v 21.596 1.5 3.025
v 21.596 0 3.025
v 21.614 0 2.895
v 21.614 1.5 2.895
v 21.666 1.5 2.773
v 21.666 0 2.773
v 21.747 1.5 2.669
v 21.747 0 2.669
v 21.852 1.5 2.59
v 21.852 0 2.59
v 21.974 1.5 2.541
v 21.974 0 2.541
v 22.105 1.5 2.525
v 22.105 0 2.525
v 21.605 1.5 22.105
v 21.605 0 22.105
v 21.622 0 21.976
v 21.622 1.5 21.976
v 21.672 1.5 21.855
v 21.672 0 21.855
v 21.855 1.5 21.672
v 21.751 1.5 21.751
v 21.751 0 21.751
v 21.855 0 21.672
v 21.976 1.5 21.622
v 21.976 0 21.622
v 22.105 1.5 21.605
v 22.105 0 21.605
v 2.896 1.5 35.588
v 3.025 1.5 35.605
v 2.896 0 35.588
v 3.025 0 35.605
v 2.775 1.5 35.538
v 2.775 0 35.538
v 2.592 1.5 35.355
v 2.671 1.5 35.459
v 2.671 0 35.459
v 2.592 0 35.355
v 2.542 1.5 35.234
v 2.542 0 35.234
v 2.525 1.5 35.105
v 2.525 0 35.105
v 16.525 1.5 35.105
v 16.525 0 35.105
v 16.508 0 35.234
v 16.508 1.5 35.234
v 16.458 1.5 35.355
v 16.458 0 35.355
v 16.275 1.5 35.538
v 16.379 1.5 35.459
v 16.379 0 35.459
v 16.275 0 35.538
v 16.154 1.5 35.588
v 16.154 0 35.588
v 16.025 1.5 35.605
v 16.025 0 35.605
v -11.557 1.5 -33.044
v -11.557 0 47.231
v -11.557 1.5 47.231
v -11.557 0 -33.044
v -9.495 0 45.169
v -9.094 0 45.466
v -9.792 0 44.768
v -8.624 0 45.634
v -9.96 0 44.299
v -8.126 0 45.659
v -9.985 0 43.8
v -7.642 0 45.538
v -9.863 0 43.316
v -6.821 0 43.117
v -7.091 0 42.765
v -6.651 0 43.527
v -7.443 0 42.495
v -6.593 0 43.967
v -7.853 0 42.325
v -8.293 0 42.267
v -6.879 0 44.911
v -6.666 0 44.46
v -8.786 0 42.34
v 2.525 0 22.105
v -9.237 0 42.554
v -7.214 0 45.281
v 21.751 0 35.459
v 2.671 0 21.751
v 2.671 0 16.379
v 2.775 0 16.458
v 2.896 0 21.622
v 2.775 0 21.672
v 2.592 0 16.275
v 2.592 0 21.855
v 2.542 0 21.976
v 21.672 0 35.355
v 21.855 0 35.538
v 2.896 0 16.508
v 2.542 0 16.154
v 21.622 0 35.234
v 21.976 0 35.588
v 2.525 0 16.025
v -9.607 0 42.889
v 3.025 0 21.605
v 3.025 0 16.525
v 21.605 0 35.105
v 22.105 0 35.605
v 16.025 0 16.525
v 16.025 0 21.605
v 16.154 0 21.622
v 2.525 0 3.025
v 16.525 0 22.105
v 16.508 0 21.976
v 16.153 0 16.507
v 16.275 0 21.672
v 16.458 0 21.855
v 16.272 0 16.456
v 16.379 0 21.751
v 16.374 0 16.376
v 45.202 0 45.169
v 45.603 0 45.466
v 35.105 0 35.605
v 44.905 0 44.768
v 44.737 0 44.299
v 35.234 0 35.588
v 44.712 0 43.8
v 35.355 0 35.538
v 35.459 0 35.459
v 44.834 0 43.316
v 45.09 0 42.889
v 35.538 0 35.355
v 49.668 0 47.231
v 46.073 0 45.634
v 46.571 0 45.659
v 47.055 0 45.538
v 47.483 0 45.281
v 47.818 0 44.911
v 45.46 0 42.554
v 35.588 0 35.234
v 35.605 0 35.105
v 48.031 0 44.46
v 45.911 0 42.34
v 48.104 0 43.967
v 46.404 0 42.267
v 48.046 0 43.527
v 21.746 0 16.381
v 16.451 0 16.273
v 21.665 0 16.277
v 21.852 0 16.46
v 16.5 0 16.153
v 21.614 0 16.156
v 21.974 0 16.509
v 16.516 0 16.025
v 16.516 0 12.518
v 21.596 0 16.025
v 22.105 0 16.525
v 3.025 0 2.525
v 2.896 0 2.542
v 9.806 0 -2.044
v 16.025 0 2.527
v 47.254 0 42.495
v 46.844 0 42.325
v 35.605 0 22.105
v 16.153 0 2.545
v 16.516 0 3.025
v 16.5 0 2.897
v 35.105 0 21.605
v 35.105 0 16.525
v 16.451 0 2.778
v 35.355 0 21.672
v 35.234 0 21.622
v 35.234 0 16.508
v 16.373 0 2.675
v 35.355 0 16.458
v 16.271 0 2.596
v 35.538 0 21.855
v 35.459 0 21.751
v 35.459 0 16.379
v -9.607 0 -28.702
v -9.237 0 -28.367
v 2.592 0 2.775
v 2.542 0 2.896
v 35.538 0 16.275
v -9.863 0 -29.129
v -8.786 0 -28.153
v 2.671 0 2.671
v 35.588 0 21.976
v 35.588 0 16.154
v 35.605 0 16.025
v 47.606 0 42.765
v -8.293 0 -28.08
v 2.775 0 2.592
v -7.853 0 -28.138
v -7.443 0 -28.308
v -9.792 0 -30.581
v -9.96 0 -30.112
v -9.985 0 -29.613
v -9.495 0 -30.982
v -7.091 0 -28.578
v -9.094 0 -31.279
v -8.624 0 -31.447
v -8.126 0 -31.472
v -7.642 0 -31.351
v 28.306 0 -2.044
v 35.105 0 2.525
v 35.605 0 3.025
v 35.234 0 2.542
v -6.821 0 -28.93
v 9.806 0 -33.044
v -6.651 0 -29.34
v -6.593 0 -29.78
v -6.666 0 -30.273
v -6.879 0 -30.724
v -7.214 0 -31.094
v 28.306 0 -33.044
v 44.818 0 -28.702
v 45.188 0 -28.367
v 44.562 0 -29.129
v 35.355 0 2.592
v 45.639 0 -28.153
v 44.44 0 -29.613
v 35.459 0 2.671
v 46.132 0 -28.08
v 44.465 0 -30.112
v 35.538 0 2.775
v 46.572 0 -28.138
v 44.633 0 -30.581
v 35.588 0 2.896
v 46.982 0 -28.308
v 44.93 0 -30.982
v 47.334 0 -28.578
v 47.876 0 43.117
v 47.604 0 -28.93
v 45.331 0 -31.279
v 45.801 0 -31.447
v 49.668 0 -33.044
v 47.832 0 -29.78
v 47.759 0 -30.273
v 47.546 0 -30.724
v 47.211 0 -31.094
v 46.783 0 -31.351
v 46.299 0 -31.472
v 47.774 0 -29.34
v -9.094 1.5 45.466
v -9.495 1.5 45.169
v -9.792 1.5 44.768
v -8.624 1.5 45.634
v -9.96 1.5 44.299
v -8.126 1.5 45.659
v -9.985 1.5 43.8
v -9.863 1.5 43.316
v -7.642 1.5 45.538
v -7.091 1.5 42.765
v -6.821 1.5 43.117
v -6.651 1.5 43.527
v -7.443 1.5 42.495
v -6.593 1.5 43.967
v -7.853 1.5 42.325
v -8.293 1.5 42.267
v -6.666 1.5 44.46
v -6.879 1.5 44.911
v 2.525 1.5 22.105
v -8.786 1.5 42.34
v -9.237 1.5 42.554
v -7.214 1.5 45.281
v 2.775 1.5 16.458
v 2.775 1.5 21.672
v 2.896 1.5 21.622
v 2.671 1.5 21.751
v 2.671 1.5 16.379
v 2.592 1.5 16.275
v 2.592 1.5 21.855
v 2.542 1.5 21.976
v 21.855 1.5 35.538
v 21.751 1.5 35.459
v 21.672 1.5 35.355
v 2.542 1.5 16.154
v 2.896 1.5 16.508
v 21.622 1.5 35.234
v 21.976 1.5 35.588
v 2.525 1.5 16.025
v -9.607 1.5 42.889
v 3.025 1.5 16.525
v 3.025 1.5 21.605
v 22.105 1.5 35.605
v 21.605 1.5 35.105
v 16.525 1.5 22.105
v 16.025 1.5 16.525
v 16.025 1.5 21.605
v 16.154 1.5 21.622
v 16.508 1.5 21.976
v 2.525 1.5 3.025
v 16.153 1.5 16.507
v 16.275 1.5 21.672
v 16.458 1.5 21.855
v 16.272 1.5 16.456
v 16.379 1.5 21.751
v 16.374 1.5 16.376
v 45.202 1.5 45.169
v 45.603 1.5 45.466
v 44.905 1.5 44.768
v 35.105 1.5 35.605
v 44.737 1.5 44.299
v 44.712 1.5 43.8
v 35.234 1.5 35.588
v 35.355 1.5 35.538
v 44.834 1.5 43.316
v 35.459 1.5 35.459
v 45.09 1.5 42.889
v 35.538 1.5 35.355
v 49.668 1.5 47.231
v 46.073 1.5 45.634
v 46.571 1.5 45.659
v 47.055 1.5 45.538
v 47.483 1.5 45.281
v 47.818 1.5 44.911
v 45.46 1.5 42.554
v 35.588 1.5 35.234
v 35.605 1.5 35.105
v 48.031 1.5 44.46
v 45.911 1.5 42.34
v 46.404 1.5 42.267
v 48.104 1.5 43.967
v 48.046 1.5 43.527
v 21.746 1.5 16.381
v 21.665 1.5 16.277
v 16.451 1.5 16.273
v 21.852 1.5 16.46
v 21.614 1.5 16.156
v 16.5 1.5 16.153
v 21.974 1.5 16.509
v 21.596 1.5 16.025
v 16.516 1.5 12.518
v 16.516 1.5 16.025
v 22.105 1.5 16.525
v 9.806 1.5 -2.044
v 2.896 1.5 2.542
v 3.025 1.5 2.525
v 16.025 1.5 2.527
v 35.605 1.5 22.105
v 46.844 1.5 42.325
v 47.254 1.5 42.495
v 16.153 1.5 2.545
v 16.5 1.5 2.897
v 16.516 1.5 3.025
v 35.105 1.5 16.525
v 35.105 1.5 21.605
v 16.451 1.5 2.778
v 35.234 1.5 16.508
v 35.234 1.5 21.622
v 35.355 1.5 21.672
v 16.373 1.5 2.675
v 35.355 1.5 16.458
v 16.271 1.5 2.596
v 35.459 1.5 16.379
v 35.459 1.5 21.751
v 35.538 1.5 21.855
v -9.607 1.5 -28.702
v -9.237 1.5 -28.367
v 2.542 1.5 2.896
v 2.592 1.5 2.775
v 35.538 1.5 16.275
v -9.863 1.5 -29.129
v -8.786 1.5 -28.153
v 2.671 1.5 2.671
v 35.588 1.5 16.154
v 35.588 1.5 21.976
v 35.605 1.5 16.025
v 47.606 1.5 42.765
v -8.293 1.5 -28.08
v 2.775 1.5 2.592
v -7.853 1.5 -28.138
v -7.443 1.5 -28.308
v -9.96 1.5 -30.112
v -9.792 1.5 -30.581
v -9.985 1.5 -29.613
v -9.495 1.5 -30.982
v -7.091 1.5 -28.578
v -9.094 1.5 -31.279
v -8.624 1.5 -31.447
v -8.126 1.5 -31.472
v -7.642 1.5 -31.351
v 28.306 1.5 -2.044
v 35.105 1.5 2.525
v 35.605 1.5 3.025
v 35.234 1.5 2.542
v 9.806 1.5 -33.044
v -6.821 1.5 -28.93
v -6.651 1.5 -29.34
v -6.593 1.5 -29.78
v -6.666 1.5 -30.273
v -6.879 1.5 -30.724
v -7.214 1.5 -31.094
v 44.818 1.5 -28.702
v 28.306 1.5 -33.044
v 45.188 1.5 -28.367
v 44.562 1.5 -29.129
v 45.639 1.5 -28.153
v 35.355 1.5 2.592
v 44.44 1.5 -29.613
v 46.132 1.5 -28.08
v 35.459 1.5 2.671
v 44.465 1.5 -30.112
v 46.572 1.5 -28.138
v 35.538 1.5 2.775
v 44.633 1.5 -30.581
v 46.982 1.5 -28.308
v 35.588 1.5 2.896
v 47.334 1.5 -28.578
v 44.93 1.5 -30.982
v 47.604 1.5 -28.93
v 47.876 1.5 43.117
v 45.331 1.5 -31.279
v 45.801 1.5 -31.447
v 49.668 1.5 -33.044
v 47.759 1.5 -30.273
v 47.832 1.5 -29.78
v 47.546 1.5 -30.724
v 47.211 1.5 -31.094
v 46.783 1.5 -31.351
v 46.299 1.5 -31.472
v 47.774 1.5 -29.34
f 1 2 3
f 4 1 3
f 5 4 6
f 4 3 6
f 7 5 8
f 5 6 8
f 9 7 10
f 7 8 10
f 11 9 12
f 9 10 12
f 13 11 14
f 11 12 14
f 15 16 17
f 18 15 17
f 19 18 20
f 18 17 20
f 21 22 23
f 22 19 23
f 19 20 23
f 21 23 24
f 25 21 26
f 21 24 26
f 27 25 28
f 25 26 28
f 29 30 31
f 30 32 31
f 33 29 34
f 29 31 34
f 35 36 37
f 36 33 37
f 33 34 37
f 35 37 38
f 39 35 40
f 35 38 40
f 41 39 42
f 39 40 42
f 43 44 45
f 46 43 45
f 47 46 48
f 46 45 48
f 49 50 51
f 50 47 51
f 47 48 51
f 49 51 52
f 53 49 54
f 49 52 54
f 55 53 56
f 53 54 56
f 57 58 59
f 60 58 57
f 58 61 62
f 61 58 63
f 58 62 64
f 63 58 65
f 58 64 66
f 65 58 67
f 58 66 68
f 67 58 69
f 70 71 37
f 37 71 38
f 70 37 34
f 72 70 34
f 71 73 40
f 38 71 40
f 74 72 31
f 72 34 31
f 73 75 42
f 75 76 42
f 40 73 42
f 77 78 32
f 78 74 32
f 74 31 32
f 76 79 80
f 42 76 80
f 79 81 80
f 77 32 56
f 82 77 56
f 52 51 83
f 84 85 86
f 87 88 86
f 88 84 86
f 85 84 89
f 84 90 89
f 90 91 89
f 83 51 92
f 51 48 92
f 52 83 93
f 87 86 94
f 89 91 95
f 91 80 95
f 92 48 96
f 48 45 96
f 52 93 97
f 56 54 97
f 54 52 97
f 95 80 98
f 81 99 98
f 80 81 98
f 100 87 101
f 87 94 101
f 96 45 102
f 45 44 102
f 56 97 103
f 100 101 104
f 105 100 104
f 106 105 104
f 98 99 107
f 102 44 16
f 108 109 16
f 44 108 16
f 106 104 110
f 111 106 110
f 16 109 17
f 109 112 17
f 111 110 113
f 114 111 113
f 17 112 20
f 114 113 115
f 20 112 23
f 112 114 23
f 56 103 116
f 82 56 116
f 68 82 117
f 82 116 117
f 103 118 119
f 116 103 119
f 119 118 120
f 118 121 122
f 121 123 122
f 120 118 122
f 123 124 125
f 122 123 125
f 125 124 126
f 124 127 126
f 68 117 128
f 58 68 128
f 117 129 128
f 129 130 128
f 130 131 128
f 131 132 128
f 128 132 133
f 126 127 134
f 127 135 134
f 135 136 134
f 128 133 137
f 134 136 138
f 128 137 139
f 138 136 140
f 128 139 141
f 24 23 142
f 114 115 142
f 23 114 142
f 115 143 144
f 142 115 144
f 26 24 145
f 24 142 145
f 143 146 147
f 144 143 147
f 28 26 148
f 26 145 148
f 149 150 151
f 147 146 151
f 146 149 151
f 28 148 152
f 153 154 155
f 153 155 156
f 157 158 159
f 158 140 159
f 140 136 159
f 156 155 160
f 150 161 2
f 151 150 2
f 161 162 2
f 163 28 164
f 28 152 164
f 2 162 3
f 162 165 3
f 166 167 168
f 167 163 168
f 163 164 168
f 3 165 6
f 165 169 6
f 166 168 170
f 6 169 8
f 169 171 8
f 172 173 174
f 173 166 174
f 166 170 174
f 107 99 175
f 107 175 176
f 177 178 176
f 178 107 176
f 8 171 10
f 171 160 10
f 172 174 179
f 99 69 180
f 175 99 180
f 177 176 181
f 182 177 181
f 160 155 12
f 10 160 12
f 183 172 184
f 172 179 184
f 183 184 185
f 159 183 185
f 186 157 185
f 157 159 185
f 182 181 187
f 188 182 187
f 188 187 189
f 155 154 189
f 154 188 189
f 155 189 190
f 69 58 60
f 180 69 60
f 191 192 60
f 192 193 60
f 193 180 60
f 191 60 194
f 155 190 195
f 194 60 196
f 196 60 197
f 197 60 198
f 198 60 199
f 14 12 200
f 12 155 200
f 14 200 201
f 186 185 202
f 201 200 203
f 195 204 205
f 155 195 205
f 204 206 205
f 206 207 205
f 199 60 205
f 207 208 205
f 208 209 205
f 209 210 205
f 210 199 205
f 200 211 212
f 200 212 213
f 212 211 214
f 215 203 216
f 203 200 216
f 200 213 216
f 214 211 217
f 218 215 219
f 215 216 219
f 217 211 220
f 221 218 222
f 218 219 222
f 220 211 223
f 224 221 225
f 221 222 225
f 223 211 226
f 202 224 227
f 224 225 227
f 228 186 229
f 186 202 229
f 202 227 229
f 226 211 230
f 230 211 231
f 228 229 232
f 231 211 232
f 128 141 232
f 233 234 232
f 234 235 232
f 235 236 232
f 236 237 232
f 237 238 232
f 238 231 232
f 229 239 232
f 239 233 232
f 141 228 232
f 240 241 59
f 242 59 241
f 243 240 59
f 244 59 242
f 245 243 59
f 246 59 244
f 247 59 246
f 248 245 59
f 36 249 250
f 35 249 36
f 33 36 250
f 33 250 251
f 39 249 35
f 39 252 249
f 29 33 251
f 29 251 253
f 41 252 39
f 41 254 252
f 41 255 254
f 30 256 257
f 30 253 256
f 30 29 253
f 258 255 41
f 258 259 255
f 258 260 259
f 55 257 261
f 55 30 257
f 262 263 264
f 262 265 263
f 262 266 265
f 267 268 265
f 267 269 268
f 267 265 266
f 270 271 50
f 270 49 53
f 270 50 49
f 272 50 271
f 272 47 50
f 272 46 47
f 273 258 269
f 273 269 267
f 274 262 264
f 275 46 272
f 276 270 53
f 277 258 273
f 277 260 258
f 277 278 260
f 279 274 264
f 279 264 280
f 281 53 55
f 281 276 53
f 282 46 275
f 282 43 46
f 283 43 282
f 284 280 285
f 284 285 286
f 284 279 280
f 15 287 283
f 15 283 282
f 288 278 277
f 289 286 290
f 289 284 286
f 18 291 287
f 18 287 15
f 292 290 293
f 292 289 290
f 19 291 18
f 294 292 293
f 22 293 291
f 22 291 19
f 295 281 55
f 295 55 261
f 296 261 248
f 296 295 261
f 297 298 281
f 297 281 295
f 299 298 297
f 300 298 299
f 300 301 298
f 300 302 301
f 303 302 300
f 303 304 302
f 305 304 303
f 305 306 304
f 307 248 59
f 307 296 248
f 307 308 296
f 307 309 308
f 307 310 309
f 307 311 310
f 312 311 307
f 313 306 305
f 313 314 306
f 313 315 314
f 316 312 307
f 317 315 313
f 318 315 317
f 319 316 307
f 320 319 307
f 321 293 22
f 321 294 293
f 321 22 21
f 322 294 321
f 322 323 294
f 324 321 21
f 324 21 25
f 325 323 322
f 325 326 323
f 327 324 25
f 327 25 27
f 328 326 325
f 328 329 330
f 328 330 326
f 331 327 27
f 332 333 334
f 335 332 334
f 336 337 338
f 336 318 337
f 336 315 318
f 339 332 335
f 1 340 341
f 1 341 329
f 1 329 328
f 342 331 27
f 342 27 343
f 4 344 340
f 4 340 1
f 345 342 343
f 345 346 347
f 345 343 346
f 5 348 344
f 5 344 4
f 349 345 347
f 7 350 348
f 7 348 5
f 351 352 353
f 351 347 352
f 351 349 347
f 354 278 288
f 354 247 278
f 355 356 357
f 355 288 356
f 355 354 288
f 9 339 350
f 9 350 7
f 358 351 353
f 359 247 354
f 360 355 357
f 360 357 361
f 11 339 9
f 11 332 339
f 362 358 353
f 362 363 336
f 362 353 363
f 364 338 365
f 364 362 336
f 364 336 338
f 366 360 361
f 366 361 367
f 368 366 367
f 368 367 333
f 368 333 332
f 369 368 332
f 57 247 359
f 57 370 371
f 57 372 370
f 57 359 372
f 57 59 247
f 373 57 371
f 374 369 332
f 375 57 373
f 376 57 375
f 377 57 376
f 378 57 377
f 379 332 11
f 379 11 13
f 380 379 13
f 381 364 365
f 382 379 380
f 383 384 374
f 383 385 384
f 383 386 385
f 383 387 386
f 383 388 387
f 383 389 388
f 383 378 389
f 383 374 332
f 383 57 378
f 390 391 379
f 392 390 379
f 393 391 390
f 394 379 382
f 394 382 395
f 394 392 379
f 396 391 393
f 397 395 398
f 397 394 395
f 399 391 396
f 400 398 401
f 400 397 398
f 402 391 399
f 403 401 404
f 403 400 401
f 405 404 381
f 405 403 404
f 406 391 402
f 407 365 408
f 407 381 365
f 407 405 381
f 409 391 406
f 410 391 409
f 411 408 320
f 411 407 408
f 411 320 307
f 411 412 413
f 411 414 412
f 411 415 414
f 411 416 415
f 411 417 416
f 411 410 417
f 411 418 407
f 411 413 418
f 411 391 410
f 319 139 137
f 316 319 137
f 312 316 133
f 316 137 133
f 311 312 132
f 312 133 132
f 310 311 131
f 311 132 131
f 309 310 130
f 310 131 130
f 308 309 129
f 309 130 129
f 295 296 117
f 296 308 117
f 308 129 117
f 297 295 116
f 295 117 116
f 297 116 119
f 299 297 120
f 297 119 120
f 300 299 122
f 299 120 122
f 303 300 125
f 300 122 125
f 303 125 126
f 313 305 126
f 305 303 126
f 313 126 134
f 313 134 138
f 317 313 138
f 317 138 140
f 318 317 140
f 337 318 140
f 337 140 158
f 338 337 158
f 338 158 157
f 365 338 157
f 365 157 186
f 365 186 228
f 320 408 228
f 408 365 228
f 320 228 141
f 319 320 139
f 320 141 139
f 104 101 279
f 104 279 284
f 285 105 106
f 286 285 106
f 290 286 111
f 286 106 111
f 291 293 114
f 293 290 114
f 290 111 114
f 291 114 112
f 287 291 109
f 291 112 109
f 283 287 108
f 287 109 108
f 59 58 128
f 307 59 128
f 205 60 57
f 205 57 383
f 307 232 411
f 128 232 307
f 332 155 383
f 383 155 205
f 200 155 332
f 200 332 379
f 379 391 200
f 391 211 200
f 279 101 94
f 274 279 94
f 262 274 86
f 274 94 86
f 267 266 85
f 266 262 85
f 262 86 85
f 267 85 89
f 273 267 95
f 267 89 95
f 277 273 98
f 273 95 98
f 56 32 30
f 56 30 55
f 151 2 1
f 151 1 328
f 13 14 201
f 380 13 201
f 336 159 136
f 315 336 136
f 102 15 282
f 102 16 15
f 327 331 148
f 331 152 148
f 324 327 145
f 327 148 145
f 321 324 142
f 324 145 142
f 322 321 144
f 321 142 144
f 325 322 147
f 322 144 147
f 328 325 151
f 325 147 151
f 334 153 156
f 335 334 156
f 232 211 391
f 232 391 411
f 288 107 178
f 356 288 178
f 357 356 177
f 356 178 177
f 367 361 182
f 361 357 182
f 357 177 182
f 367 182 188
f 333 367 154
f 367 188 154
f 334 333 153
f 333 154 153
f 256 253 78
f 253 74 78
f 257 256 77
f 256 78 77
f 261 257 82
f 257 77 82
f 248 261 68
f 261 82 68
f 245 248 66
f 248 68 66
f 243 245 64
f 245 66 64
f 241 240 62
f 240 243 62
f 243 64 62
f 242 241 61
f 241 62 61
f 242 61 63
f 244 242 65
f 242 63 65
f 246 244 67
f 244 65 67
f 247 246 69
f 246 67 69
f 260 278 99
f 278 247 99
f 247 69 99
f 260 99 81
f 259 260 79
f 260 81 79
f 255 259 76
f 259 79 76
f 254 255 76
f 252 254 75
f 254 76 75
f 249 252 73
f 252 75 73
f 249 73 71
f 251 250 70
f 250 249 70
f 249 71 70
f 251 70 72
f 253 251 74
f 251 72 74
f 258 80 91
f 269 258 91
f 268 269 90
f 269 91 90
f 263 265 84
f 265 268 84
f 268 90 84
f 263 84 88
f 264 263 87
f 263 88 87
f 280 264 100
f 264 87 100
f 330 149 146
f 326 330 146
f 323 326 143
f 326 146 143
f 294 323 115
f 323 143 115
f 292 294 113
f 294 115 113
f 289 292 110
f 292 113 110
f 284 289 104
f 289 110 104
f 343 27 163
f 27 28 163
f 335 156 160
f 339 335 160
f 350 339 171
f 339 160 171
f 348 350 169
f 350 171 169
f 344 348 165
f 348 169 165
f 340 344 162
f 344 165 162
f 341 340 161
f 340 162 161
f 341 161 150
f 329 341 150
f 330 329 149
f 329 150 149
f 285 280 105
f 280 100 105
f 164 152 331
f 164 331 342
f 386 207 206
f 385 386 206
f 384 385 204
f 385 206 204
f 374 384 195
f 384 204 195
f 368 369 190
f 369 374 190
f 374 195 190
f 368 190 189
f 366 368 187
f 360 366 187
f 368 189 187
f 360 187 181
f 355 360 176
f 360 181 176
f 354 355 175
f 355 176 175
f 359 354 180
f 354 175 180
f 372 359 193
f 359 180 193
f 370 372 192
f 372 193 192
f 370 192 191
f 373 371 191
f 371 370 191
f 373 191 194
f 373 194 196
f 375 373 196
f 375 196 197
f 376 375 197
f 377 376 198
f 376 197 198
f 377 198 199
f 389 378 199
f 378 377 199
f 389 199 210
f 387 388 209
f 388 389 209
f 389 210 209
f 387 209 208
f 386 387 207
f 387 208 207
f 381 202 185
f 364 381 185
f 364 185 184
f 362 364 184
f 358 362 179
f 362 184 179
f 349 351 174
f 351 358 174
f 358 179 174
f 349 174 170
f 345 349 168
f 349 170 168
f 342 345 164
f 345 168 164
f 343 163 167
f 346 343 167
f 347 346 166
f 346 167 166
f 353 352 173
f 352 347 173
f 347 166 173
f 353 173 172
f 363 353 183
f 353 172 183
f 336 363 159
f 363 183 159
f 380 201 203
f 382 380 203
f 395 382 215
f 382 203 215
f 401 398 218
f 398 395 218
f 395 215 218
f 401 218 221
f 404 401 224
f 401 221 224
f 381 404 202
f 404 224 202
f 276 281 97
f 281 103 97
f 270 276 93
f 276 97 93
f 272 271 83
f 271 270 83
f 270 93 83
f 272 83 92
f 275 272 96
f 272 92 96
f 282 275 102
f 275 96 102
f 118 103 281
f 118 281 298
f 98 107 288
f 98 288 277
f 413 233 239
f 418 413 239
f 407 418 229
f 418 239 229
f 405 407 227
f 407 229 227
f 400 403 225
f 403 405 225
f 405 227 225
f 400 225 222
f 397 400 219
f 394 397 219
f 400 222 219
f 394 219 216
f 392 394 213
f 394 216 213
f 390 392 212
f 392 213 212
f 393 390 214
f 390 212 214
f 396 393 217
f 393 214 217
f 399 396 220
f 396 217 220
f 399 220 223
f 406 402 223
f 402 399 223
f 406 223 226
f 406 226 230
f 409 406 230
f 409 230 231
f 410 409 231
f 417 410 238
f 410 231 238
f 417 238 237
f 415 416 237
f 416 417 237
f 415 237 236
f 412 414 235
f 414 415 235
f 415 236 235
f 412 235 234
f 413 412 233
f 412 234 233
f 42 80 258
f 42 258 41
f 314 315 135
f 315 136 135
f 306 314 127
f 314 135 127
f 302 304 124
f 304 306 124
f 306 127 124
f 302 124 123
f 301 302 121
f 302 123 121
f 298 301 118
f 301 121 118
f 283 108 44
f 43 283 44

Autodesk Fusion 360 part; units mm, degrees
sketch "plate-2025-11-20T02_26_56.904Z" plane through (0, 0, 0) normal (0, 1, 0) x (1, 0, 0)
sketch "plate-2025-11-20T02_26_56.904Z (1)" plane through (0, 0, 0) normal (0, 1, 0) x (1, 0, 0)
  line L0 (3.025, -2.525) -> (16.025, -2.5274)
  line L1 (3.025, -16.525) -> (16.025, -16.525)
  line L2 (2.525, -3.025) -> (2.525, -16.025)
  line L3 (16.5157, -3.025) -> (16.5157, -16.025)
  arc A0 (3.025, -2.525) -> (2.525, -3.025) centre (3.025, -3.025) ccw
  arc A1 (16.5157, -3.025) -> (16.025, -2.5274) centre (16.0207, -3.0224) ccw
  arc A2 (2.525, -16.025) -> (3.025, -16.525) centre (3.025, -16.025) ccw
  arc A3 (16.025, -16.525) -> (16.5157, -16.025) centre (16.0194, -16.0287) ccw
  line L4 (22.105, -2.525) -> (35.105, -2.525)
  line L5 (22.105, -16.525) -> (35.105, -16.525)
  line L6 (21.5957, -3.025) -> (21.5957, -16.025)
  line L7 (35.605, -3.025) -> (35.605, -16.025)
  arc A4 (22.105, -2.525) -> (21.5957, -3.025) centre (22.1001, -3.0294) ccw
  arc A5 (35.605, -3.025) -> (35.105, -2.525) centre (35.105, -3.025) ccw
  arc A6 (21.5957, -16.025) -> (22.105, -16.525) centre (22.0993, -16.0214) ccw
  arc A7 (35.105, -16.525) -> (35.605, -16.025) centre (35.105, -16.025) ccw
  line L8 (3.025, -21.605) -> (16.025, -21.605)
  line L9 (3.025, -35.605) -> (16.025, -35.605)
  line L10 (2.525, -22.105) -> (2.525, -35.105)
  line L11 (16.525, -22.105) -> (16.525, -35.105)
  arc A8 (3.025, -21.605) -> (2.525, -22.105) centre (3.025, -22.105) ccw
  arc A9 (16.525, -22.105) -> (16.025, -21.605) centre (16.025, -22.105) ccw
  arc A10 (2.525, -35.105) -> (3.025, -35.605) centre (3.025, -35.105) ccw
  arc A11 (16.025, -35.605) -> (16.525, -35.105) centre (16.025, -35.105) ccw
  line L12 (22.105, -21.605) -> (35.105, -21.605)
  line L13 (22.105, -35.605) -> (35.105, -35.605)
  line L14 (21.605, -22.105) -> (21.605, -35.105)
  line L15 (35.605, -22.105) -> (35.605, -35.105)
  arc A12 (22.105, -21.605) -> (21.605, -22.105) centre (22.105, -22.105) ccw
  arc A13 (35.605, -22.105) -> (35.105, -21.605) centre (35.105, -22.105) ccw
  arc A14 (21.605, -35.105) -> (22.105, -35.605) centre (22.105, -35.105) ccw
  arc A15 (35.105, -35.605) -> (35.605, -35.105) centre (35.105, -35.105) ccw
  line L16 (16.5157, -12.518) -> (19.0557, -12.518)
  line L17 (19.0557, -12.518) -> (19.0557, -19)
  line L18 (19.0557, -19) -> (42.8682, -19)
  line L19 (42.8682, -19) -> (42.8682, -40.431)
  line L20 (42.8682, -40.431) -> (-4.7568, -40.431)
  line L21 (-4.7568, -40.431) -> (-4.7568, 26.244)
  line L22 (-4.7568, 26.244) -> (42.8682, 26.244)
  line L23 (42.8682, 26.244) -> (42.8682, -40.431)
  line L24 (9.8057, 26.244) -> (28.3057, 26.244)
  line L25 (-4.7568, 26.244) -> (-11.5568, 26.244)
  line L26 (-4.7568, 26.244) -> (-4.7568, 33.044)
  line L27 (42.8682, 26.244) -> (42.8682, 33.044)
  line L28 (42.8682, 26.244) -> (49.6682, 26.244)
  line L29 (42.8682, -40.431) -> (42.8682, -47.231)
  line L30 (42.8682, -40.431) -> (49.6682, -40.431)
  line L31 (-4.7568, -40.431) -> (-4.7568, -47.231)
  line L32 (-4.7568, -40.431) -> (-11.5568, -40.431)
  line L33 (-11.5568, 26.244) -> (-11.5568, 33.044)
  line L34 (42.8682, -47.231) -> (49.6682, -47.231)
  line L35 (49.6682, -47.231) -> (-11.5568, -47.231)
  line L36 (-11.5568, -47.231) -> (-11.5568, 33.044)
  line L37 (-11.5568, 33.044) -> (49.6682, 33.044)
  line L38 (49.6682, 33.044) -> (49.6682, -47.231)
  line L39 (9.8057, 26.244) -> (9.8057, 33.044)
  line L40 (9.8057, 33.044) -> (33, 33.044)
  line L41 (9.8057, 2.044) -> (9.8057, 33.044)
  line L42 (9.8057, 2.044) -> (28.3057, 2.044)
  line L43 (28.3057, 2.044) -> (9.8057, 2.044)
  line L44 (9.8057, 2.044) -> (9.8057, 33.044)
  line L45 (9.8057, 33.044) -> (28.3057, 33.044)
  line L46 (28.3057, 33.044) -> (28.3057, 2.044)
  line L47 (-4.7568, -40.431) -> (-8.2928, -40.431)
  line L48 (-8.2928, -40.431) -> (-8.2928, -43.967)
  line L49 (-4.7568, 26.244) -> (-8.2928, 26.244)
  line L50 (-8.2928, 26.244) -> (-8.2928, 29.78)
  line L51 (49.6682, 26.244) -> (46.1322, 26.244)
  line L52 (46.1322, 26.244) -> (46.1322, 29.78)
  line L53 (42.8682, -40.431) -> (46.4042, -40.431)
  line L54 (46.4042, -40.431) -> (46.4042, -43.967)
  circle A16 centre (-8.2928, -43.967) radius 1.7
  circle A17 centre (-8.2928, 29.78) radius 1.7
  circle A18 centre (46.1322, 29.78) radius 1.7
  circle A19 centre (46.4042, -43.967) radius 1.7
  point P0 (9.8057, 26.244)
  dimension "d6" = 5.08
  dimension "d7" = 5.08
  dimension "d8" = 5.08
  dimension "d9" = 5.08
  dimension "d10" = 2.54
  dimension "d12" = 23.8125
  dimension "d13" = 21.431
  dimension "d14" = 66.675
  dimension "d15" = 47.625
  dimension "d16" = 14.5625
  dimension "d18" = 21.431
  dimension "d20" = 6.8
  dimension "d21" = 6.8
  dimension "d22" = 6.8
  dimension "d23" = 6.8
  dimension "d24" = 6.8
  dimension "d25" = 6.8
  dimension "d26" = 6.8
  dimension "d27" = 6.8
  dimension "d28" = 6.8
  dimension "d29" = 6.8
  dimension "d30" = 31
  dimension "d32" = 18.5
  dimension "d33" = 3.536
  dimension "d34" = 3.536
  dimension "d35" = 3.536
  dimension "d36" = 3.536
  dimension "d37" = 3.536
  dimension "d38" = 3.536
  dimension "d39" = 3.536
  dimension "d40" = 3.536
  dimension "d41" = 3.4
  dimension "d42" = 3.4
  dimension "d43" = 3.4
  dimension "d44" = 3.4
extrude "Extrude1" add sketch "plate-2025-11-20T02_26_56.904Z (1)" along normal blind 1.5 contours L19 L20 L21 L22 L23 L41 L42 L43 L44 L46 makes body 1
extrude "Extrude2" add sketch "plate-2025-11-20T02_26_56.904Z (1)" along normal blind 1.5 separate body contours L19 L23 L28 L30 L38 L51 L53 | L29 L30 L34 L35 L38 L53 | L27 L28 L37 L38 L51 makes body 2
extrude "Extrude3" add sketch "plate-2025-11-20T02_26_56.904Z (1)" along normal blind 1.5 contours L20 L29 L31 L35 | L31 L32 L35 L36 L47 bodies 1 2
extrude "Extrude4" add sketch "plate-2025-11-20T02_26_56.904Z (1)" along normal blind 1.5 contours L21 L25 L32 L36 L47 L49 | L25 L26 L33 L36 L37 L49 bodies 1
extrude "Extrude5" add sketch "plate-2025-11-20T02_26_56.904Z (1)" along normal blind 1.5 contours L22 L26 L37 L39 L41 L44 bodies 1
extrude "Extrude6" add sketch "plate-2025-11-20T02_26_56.904Z (1)" along normal blind 1.5 contours L22 L27 L37 L40 L46 bodies 1
equation "d12 = ( 47.625 / 2 ) * 1 mm"
